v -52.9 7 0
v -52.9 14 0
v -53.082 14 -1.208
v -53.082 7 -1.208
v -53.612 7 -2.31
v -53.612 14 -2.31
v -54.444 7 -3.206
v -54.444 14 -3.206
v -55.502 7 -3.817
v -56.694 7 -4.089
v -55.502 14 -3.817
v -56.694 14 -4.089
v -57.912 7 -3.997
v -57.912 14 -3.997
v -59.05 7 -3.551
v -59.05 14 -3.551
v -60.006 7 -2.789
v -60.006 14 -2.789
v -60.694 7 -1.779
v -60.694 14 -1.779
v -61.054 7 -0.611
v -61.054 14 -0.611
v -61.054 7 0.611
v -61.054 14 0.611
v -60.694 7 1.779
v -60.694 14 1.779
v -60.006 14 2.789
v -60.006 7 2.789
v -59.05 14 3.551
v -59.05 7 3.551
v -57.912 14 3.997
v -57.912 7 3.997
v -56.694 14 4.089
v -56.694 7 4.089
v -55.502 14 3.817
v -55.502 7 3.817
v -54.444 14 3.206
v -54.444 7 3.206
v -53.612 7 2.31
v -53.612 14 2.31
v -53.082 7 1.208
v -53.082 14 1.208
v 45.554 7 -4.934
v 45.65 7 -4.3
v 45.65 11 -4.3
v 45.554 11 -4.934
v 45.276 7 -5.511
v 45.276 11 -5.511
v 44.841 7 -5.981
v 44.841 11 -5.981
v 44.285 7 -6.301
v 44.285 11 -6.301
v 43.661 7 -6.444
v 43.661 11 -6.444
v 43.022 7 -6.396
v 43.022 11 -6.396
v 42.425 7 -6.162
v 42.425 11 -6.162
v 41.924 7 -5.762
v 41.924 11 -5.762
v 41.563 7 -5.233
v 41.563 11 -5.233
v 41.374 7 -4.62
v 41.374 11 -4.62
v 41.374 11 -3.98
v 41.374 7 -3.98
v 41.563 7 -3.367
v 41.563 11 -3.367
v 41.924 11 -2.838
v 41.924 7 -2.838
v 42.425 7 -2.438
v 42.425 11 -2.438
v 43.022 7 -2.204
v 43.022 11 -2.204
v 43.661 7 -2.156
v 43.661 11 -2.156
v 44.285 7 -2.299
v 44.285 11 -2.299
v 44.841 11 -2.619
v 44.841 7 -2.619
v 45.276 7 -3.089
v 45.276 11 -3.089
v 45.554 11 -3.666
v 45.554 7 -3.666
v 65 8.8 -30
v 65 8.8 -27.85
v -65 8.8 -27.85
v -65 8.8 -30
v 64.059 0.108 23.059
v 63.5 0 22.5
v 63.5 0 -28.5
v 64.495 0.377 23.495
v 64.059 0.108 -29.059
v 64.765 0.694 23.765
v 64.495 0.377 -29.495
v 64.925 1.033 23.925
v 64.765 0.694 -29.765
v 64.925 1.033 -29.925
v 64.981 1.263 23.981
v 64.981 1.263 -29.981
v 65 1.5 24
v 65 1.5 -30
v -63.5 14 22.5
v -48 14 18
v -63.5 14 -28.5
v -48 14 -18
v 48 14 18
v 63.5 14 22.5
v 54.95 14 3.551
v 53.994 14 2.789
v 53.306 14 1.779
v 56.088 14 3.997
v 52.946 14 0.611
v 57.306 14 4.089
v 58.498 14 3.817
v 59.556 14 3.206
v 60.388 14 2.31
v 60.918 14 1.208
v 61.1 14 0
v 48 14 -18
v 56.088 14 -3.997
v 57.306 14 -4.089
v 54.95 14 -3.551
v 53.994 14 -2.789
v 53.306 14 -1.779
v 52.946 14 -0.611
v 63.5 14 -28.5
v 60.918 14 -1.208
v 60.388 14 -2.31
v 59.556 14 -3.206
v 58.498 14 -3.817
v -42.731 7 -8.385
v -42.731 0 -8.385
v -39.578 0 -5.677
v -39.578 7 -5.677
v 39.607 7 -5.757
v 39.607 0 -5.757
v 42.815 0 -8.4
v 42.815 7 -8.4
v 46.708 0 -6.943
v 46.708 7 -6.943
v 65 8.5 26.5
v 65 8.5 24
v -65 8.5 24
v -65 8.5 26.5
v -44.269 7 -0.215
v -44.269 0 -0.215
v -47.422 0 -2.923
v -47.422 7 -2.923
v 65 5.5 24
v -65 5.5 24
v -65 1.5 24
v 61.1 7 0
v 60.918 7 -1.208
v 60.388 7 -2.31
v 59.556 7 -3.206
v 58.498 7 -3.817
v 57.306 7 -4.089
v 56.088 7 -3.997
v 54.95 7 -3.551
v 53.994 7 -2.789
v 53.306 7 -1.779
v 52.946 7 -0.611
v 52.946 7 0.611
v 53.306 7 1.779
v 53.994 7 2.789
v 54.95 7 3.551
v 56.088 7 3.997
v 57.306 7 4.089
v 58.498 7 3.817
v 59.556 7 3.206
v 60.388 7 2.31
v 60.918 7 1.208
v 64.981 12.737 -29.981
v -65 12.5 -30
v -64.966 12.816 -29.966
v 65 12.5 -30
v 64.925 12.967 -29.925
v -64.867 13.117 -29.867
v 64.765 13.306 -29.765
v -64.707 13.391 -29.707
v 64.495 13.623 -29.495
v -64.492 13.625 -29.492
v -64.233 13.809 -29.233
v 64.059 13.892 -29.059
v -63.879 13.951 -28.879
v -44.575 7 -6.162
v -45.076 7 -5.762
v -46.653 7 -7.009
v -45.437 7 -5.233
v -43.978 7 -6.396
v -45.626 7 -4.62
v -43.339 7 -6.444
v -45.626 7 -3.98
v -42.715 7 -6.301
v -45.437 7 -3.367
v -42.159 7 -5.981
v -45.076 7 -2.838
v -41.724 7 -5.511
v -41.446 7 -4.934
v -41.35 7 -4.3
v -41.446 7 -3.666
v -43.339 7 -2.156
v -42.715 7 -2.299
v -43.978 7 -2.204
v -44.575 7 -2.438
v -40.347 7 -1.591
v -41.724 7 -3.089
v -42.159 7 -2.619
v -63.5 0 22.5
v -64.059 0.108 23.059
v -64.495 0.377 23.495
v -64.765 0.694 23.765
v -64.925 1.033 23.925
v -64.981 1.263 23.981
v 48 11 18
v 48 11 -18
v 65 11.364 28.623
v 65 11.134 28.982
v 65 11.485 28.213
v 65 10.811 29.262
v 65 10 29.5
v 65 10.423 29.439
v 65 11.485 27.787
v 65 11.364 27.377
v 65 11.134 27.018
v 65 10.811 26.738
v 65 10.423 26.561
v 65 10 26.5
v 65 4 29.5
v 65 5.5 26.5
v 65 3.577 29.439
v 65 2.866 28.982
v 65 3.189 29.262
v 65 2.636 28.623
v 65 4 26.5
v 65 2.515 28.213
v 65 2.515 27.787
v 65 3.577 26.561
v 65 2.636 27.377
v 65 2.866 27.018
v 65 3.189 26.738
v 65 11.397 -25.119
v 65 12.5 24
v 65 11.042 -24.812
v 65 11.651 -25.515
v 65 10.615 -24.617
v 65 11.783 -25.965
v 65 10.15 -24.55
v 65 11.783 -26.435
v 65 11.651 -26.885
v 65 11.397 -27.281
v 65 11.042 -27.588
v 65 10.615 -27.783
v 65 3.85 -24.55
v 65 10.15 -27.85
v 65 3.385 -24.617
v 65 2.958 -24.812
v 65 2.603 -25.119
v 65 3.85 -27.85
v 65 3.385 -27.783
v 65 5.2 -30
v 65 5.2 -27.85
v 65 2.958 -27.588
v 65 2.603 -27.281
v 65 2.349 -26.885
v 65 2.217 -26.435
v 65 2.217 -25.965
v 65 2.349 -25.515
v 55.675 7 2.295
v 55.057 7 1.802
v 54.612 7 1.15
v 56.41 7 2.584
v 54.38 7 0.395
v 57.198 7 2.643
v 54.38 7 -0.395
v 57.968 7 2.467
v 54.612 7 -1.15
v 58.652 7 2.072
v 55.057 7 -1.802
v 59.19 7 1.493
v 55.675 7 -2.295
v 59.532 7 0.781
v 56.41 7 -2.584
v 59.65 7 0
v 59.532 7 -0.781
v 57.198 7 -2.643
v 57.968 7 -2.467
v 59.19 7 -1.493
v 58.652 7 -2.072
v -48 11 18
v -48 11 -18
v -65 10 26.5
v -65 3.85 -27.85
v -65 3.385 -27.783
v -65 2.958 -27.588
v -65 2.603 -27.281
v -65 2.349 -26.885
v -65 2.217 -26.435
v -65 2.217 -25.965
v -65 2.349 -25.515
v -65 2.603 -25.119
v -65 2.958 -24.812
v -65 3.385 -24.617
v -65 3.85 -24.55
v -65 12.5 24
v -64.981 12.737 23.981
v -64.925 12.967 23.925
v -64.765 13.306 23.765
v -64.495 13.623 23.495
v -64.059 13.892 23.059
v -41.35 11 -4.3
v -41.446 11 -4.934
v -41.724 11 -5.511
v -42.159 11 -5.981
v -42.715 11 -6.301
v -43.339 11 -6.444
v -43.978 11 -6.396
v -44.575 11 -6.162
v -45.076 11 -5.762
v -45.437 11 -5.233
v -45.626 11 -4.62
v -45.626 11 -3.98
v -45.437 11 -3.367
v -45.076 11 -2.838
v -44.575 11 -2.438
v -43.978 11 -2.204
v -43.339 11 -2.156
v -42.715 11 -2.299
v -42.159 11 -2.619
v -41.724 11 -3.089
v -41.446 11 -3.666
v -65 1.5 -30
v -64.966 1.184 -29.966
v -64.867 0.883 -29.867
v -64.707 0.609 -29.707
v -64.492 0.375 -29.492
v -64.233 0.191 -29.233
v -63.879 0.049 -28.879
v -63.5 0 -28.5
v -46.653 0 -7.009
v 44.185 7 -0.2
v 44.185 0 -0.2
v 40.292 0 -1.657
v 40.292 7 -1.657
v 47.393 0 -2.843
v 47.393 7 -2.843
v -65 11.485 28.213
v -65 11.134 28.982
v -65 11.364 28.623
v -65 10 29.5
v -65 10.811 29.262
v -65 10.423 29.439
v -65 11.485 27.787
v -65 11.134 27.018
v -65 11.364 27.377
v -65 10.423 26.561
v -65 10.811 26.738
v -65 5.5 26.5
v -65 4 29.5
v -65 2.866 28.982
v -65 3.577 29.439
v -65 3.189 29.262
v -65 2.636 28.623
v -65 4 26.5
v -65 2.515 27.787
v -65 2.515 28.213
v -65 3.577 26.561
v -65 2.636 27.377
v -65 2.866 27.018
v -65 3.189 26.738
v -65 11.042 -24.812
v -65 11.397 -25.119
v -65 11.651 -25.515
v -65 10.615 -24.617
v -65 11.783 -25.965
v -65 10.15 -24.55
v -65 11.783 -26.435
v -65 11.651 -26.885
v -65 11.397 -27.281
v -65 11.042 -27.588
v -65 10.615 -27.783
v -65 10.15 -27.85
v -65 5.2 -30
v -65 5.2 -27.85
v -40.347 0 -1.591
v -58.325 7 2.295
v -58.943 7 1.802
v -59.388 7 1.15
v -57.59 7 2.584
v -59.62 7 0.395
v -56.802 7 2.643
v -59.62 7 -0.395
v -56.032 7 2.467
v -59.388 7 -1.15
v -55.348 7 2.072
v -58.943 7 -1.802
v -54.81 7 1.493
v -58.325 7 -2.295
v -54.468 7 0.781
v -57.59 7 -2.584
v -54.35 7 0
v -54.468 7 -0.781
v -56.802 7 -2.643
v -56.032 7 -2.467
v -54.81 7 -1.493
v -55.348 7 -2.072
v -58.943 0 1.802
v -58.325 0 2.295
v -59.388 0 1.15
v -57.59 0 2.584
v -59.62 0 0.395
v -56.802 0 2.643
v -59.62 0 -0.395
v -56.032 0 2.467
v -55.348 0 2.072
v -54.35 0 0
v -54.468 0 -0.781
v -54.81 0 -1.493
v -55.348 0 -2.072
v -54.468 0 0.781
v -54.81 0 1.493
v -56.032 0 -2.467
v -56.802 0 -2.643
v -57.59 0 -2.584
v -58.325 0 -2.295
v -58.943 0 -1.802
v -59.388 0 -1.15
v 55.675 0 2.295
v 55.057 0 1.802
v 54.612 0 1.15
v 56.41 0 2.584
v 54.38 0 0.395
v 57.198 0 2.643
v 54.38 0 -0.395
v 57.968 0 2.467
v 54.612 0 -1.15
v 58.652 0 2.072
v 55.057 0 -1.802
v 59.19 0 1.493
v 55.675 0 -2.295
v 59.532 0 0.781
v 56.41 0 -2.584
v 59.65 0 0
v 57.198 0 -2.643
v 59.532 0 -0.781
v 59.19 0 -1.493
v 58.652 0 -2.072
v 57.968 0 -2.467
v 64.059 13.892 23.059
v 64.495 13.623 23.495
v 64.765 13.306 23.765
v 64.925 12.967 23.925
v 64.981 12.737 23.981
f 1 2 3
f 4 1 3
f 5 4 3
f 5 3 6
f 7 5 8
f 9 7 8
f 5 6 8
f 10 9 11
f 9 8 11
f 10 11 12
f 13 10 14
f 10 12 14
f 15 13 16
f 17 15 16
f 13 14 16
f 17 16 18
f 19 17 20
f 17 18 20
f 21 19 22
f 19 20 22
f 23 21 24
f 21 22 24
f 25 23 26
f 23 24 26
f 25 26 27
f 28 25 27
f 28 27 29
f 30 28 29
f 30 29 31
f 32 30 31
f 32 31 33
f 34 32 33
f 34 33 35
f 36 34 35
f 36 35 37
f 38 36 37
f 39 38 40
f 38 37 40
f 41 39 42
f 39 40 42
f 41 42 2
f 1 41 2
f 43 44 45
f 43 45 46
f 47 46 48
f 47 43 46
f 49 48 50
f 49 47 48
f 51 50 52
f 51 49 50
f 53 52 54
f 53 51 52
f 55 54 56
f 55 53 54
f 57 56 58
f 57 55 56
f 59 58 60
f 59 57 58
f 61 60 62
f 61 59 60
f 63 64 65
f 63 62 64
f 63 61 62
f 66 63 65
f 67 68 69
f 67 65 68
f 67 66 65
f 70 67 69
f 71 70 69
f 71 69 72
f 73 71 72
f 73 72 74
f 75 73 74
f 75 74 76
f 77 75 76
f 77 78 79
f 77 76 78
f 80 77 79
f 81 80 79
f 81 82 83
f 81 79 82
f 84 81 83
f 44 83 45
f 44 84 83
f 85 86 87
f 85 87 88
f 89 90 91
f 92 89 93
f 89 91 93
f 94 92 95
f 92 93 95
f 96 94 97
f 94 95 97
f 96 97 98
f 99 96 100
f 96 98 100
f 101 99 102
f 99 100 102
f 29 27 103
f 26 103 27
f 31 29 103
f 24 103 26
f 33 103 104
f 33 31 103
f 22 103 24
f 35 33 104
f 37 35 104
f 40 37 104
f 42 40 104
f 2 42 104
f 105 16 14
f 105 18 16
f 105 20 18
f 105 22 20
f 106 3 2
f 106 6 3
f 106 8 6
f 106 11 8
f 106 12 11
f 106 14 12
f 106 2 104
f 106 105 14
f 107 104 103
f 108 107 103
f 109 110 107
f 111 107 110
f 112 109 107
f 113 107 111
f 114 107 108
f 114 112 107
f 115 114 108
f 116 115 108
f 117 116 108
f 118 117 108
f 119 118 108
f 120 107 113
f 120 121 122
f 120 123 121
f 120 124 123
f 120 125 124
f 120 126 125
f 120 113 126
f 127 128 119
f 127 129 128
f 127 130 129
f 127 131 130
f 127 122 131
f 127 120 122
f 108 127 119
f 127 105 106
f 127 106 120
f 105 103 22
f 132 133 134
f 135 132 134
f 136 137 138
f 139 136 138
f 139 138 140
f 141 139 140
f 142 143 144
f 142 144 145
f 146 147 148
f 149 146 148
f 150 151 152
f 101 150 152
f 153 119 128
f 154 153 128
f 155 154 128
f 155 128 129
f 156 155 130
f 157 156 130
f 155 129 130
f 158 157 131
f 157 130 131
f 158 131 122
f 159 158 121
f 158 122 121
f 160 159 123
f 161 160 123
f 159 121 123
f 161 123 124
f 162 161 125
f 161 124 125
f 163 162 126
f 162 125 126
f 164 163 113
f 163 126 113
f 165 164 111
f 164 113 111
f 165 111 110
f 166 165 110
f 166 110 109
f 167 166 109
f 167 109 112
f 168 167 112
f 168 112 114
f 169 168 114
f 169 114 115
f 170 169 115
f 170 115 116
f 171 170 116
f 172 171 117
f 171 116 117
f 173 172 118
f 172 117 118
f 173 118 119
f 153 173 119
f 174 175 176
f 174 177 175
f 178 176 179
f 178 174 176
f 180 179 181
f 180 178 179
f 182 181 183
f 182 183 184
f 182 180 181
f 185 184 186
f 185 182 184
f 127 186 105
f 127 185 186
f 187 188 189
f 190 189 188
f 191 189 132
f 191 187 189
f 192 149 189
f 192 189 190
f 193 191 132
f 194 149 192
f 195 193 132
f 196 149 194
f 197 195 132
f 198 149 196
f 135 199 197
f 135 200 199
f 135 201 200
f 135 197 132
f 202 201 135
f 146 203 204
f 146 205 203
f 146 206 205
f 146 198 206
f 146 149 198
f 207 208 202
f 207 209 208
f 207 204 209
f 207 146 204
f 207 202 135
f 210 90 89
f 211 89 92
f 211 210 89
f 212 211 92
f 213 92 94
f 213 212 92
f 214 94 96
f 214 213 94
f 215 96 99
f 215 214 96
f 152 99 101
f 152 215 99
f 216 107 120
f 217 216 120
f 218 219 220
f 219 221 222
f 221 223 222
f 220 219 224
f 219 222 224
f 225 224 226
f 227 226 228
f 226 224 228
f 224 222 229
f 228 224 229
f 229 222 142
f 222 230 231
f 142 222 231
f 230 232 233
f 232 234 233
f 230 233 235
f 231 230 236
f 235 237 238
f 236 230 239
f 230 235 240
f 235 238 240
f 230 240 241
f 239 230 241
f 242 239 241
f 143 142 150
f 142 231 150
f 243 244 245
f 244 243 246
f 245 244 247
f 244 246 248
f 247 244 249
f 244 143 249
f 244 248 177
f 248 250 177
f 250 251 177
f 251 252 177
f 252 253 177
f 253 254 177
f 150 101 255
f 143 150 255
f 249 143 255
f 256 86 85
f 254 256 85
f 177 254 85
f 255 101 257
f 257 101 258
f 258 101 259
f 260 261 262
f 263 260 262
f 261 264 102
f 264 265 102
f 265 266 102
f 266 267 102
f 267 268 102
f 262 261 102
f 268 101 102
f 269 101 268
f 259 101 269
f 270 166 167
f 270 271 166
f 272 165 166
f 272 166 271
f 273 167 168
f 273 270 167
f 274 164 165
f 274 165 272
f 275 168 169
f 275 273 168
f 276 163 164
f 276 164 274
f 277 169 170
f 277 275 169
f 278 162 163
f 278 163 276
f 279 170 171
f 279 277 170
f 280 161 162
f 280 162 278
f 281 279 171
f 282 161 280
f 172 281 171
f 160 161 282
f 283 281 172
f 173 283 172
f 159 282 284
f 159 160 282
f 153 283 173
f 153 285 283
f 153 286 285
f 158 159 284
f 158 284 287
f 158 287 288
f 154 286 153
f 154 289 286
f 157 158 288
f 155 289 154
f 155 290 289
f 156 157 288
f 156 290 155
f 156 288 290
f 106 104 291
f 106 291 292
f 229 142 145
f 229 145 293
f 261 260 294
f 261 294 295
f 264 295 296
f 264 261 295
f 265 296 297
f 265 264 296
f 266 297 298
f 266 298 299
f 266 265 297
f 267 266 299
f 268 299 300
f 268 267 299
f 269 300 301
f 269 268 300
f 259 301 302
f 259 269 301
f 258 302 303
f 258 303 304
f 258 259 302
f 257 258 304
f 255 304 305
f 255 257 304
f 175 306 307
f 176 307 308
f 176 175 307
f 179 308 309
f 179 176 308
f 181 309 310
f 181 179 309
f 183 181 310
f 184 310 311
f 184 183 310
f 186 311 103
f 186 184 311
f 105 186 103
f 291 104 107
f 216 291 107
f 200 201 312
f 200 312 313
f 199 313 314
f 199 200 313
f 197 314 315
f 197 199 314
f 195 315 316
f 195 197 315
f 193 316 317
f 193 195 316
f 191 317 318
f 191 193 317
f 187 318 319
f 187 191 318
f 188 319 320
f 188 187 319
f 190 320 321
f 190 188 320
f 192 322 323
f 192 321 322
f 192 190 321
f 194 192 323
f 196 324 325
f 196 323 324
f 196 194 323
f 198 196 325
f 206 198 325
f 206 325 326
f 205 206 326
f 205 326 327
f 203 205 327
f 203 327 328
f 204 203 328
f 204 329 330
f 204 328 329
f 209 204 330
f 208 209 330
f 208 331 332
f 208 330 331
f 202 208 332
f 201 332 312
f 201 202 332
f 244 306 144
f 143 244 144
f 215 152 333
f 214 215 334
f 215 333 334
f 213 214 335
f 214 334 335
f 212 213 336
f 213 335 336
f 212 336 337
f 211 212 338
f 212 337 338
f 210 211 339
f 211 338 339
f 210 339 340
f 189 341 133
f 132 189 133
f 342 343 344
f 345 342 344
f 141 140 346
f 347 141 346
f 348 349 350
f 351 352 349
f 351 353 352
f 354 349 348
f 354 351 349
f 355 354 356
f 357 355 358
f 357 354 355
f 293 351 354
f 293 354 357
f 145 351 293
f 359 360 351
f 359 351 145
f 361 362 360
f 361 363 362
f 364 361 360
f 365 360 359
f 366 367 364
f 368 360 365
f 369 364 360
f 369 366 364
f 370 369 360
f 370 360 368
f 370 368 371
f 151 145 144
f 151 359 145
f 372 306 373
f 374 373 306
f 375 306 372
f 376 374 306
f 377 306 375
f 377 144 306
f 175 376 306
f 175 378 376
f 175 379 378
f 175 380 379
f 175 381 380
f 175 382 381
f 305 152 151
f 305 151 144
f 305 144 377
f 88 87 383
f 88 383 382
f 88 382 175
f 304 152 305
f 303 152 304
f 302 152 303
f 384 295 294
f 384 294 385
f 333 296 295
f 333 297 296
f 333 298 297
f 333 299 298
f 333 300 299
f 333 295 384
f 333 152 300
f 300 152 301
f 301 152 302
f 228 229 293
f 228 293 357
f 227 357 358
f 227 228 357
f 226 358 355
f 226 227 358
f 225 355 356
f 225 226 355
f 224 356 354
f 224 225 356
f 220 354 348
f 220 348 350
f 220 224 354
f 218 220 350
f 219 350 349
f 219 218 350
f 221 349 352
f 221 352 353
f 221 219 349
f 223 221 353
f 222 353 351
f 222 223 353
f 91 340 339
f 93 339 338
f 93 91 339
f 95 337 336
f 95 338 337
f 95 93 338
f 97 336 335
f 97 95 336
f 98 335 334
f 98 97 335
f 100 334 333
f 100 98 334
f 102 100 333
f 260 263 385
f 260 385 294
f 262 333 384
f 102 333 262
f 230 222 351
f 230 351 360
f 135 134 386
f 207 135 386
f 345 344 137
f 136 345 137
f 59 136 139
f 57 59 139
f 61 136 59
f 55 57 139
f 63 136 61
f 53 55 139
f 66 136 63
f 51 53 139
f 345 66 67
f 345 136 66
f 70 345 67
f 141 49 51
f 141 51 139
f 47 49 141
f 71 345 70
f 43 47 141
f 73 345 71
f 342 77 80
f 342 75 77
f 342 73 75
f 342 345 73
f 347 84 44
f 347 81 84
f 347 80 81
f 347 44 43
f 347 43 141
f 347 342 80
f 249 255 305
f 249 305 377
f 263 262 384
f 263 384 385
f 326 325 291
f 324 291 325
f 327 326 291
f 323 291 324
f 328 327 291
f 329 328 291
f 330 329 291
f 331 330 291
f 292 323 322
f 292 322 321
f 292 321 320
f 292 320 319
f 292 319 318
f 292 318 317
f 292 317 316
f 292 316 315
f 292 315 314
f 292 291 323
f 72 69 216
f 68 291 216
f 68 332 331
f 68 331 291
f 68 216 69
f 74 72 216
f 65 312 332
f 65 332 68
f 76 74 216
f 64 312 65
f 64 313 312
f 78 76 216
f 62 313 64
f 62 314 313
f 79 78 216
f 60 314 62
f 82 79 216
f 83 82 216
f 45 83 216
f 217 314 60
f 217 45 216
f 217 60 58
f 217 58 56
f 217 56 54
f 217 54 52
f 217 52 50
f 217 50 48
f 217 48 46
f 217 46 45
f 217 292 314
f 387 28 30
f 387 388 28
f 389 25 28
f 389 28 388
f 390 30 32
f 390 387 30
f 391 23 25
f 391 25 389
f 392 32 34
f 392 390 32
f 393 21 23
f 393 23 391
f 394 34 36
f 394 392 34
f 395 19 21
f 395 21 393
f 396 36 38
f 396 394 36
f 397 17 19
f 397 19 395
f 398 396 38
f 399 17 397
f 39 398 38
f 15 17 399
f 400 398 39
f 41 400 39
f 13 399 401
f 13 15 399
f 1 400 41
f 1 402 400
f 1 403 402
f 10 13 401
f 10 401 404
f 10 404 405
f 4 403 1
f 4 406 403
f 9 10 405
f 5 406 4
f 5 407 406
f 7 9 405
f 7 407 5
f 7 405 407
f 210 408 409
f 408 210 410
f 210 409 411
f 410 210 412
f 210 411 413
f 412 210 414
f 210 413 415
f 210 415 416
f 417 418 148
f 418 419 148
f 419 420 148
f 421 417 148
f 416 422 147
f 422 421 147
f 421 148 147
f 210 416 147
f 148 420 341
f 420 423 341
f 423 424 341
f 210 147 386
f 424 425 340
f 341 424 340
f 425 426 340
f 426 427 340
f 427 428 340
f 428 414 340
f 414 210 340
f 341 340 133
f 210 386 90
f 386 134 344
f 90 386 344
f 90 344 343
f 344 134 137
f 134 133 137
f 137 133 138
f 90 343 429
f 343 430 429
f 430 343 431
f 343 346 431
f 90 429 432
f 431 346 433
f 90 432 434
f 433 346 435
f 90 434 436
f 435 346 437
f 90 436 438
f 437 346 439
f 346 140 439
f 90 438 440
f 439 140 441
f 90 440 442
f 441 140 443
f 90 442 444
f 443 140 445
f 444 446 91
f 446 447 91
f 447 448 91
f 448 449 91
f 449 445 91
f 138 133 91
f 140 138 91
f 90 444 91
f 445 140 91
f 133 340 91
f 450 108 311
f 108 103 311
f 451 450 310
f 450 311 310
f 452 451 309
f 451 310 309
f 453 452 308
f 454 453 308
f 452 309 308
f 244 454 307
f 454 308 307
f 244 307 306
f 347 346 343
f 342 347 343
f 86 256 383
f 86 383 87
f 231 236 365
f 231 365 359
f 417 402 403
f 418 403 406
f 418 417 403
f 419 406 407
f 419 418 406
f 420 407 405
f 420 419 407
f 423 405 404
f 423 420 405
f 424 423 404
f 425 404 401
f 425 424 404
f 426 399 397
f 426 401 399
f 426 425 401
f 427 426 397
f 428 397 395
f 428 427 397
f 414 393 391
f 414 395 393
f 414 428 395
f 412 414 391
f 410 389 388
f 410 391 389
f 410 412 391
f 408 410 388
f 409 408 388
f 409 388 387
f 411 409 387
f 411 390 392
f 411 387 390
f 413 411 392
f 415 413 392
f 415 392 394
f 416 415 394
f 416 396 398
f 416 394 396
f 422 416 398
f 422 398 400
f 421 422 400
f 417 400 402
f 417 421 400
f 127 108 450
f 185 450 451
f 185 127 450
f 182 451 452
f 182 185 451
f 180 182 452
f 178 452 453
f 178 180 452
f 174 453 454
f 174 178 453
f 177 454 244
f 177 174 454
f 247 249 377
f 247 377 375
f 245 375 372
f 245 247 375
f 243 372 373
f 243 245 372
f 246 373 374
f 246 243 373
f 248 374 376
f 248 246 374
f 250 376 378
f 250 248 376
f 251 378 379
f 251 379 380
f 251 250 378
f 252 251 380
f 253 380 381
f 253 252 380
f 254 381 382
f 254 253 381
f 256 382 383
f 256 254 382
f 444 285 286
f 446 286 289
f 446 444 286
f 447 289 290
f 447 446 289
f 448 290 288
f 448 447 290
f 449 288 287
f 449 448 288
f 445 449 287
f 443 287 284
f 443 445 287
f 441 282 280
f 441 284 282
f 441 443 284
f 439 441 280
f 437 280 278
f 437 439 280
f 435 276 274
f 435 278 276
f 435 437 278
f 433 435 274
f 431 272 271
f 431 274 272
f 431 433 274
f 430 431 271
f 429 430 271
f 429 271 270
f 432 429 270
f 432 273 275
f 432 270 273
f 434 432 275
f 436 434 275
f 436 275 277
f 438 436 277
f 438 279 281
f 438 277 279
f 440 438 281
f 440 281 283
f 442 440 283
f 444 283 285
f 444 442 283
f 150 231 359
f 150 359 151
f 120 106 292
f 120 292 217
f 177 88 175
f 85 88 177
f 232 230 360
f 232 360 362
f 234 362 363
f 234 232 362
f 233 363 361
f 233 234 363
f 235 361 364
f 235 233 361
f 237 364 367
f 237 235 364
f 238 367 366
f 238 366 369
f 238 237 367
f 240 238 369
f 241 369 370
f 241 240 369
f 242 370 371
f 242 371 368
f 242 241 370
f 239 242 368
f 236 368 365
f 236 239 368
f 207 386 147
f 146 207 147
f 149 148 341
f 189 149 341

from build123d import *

# Parameters (mm, degrees)
SKETCH1_W           = 130
SKETCH1_H           = 60
SKETCH1_R           = 2.15
SKETCH1_R_2         = 2.65
BOSS_EXTRUDE1_DEPTH = 14
CUT_EXTRUDE1_DEPTH  = 7
SKETCH3_R           = 4.1
CUT_EXTRUDE2_DEPTH  = 7
SKETCH4_W           = 96
SKETCH4_H           = 36
CUT_EXTRUDE3_DEPTH  = 3
CUT_EXTRUDE4_DEPTH  = 130
FILLET1_R           = 1.5


with BuildPart() as part:
    # Sketch1 → Boss-Extrude1 (new body)
    with BuildSketch(Plane(origin=(0, 0, 0), x_dir=(1, 0, 0), z_dir=(0, 1, 0))):
        Rectangle(SKETCH1_W, SKETCH1_H)
        with Locations((-43.5, 4.3)):
            Circle(SKETCH1_R, mode=Mode.SUBTRACT)
        with Locations((43.5, 4.3)):
            Circle(SKETCH1_R, mode=Mode.SUBTRACT)
        with Locations((-57, 0)):
            Circle(SKETCH1_R_2, mode=Mode.SUBTRACT)
        with Locations((57, 0)):
            Circle(SKETCH1_R_2, mode=Mode.SUBTRACT)
    extrude(amount=BOSS_EXTRUDE1_DEPTH)

    # Sketch2 → Cut-Extrude1 (cut)
    with BuildSketch(Plane.XZ):
        Polygon((-39.577622793, -5.676574387), (-40.346663007, -1.591408889), (-44.269040214, -0.214834502), (-47.422377207, -2.923425613), (-46.653336993, -7.008591111), (-42.730959786, -8.385165498), align=None)
        Polygon((42.815034421, -8.400100262), (46.708308195, -6.943247723), (47.393273774, -2.843147461), (44.184965579, -0.199899738), (40.291691805, -1.656752277), (39.606726226, -5.756852539), align=None)
    extrude(amount=-CUT_EXTRUDE1_DEPTH, mode=Mode.SUBTRACT)

    # Sketch3 → Cut-Extrude2 (cut)
    with BuildSketch(Plane(origin=(0, 14, 0), x_dir=(1, 0, 0), z_dir=(0, 1, 0))):
        with Locations((-57, 0)):
            Circle(SKETCH3_R)
        with Locations((57, 0)):
            Circle(SKETCH3_R)
    extrude(amount=-CUT_EXTRUDE2_DEPTH, mode=Mode.SUBTRACT)

    # Sketch4 → Cut-Extrude3 (cut)
    with BuildSketch(Plane(origin=(0, 14, 0), x_dir=(1, 0, 0), z_dir=(0, 1, 0))):
        Rectangle(SKETCH4_W, SKETCH4_H)
    extrude(amount=-CUT_EXTRUDE3_DEPTH, mode=Mode.SUBTRACT)

    # Sketch5 → Cut-Extrude4 (cut)
    with BuildSketch(Plane(origin=(65, 0, 0), x_dir=(0, 0, -1), z_dir=(1, 0, 0))):
        with BuildLine():
            Line((-24, 14), (-24, 8.5))
            Line((-24, 8.5), (-26.5, 8.5))
            Line((-26.5, 8.5), (-26.5, 10))
            ThreePointArc((-26.5, 10), (-28, 11.5), (-29.5, 10))
            Line((-29.5, 10), (-29.5, 4))
            ThreePointArc((-29.5, 4), (-28, 2.5), (-26.5, 4))
            Line((-26.5, 4), (-26.5, 5.5))
            Line((-26.5, 5.5), (-24, 5.5))
            Line((-24, 5.5), (-24, 0))
            Line((-24, 0), (-30, 0))
            Line((-30, 0), (-30, 14))
            Line((-30, 14), (-24, 14))
        make_face()
        with BuildLine():
            Line((27.85, 8.8), (30, 8.8))
            Line((30, 8.8), (30, 5.2))
            Line((30, 5.2), (27.85, 5.2))
            Line((27.85, 5.2), (27.85, 3.85))
            ThreePointArc((27.85, 3.85), (26.2, 2.2), (24.55, 3.85))
            Line((24.55, 3.85), (24.55, 10.15))
            ThreePointArc((24.55, 10.15), (26.2, 11.8), (27.85, 10.15))
            Line((27.85, 10.15), (27.85, 8.8))
        make_face()
    extrude(amount=-CUT_EXTRUDE4_DEPTH, mode=Mode.SUBTRACT)

    # Fillet1
    fillet1_edges = [part.edges().sort_by_distance(p)[0] for p in [
        (65, 0, -3),
        (65, 14, -3),
        (0, 14, 24),
        (0, 0, 24),
        (-65, 14, -3),
        (-65, 0, -3),
        (0, 0, -30),
        (0, 14, -30),
    ]]
    fillet(fillet1_edges, radius=FILLET1_R)


solid = part.part
